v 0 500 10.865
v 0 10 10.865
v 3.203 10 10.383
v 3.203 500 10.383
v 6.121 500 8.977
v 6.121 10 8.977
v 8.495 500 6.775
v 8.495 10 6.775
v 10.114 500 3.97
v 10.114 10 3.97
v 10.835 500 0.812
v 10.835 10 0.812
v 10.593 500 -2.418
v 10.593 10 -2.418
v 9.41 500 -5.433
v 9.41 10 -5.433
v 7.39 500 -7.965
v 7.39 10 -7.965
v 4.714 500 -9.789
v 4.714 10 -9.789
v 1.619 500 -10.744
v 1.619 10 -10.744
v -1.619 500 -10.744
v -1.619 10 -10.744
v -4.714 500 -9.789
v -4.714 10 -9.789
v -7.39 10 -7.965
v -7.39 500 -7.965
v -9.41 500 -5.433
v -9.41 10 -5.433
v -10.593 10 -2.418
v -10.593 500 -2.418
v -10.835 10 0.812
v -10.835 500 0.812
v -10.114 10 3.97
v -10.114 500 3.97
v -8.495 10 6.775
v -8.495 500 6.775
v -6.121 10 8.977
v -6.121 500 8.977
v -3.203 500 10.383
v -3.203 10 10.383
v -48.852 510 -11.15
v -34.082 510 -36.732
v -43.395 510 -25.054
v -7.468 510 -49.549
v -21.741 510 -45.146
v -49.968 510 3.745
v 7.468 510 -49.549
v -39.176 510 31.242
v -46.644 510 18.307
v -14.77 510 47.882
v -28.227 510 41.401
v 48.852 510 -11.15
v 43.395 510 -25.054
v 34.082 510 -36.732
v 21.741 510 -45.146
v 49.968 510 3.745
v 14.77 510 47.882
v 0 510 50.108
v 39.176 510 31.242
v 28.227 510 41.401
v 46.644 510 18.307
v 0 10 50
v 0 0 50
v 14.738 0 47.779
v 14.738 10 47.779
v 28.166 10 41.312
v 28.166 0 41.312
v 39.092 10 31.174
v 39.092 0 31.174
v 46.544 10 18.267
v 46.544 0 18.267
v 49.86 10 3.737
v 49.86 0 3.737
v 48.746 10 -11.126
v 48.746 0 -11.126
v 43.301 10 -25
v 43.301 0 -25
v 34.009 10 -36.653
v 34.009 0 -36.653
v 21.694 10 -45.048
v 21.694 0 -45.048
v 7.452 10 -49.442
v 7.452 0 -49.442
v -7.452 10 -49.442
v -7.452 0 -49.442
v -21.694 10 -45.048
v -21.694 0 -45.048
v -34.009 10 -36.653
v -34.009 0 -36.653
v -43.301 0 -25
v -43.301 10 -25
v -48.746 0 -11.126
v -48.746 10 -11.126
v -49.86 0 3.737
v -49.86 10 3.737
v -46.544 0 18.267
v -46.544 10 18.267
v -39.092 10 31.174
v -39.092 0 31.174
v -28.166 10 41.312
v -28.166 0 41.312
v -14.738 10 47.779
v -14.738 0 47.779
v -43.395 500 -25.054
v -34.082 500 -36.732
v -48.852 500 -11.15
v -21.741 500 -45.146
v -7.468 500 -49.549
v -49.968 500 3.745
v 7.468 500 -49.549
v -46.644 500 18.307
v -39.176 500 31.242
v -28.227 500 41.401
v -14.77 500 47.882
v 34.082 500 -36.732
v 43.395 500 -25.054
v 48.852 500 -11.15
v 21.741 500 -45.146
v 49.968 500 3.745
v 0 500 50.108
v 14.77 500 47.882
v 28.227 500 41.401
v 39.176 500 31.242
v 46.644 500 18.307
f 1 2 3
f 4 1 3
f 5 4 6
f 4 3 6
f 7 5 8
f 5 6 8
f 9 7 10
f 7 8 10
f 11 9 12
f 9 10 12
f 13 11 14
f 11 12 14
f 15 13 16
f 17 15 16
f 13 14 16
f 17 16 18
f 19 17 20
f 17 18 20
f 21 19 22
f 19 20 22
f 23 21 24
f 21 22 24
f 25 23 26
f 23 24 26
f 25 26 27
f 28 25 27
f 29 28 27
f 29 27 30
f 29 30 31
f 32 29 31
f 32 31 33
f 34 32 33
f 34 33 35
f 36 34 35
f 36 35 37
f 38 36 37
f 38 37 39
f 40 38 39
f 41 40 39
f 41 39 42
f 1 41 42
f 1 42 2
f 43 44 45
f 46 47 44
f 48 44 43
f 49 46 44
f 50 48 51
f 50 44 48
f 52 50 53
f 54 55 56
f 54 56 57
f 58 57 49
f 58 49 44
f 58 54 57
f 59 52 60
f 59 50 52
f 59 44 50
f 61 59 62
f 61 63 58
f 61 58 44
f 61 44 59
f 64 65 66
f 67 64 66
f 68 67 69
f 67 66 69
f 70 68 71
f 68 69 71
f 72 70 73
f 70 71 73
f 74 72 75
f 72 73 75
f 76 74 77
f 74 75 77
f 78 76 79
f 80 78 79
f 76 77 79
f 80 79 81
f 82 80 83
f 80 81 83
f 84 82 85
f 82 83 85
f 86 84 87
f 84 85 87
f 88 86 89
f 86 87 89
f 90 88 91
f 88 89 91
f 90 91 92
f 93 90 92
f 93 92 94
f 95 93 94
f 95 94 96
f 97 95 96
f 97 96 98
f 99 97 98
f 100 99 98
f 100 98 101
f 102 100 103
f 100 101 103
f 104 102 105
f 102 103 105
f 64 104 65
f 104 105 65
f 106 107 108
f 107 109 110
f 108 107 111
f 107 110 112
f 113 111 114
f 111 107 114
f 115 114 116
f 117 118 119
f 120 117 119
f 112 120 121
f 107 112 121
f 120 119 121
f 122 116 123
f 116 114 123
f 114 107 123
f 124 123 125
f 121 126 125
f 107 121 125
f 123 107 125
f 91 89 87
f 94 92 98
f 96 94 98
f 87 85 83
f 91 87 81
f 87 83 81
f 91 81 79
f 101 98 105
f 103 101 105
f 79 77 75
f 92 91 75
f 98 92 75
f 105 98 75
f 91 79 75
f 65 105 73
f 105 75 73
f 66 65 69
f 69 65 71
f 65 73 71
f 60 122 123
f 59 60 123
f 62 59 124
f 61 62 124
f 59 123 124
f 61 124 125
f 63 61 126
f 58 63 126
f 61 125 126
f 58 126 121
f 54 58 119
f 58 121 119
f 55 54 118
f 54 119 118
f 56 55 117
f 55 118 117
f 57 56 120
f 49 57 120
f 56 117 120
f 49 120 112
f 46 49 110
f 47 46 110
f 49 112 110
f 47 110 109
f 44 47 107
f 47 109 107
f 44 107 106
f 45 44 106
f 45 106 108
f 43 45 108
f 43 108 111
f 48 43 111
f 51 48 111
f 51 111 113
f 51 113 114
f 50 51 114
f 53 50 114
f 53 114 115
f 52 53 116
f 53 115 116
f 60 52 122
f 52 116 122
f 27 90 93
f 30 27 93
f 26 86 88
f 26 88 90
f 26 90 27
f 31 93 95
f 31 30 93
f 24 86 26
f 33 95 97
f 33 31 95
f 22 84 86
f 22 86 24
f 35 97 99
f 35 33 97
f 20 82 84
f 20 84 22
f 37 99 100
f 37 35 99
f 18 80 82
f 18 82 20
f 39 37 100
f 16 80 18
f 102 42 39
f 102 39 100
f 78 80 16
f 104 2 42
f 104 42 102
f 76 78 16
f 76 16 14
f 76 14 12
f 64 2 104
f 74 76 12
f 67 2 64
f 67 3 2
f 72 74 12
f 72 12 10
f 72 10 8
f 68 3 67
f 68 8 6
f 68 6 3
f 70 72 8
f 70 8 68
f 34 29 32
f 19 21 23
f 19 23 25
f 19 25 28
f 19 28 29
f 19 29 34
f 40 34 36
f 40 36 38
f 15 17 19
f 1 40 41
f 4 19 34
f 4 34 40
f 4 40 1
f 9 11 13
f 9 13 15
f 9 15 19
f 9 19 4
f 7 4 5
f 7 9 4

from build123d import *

# Parameters (mm, degrees)
SKETCH1_R           = 50
BOSS_EXTRUDE1_DEPTH = 10
SKETCH7_R           = 50.108210293
BOSS_EXTRUDE2_DEPTH = 10
SKETCH8_R           = 10.865455154
BOSS_EXTRUDE3_DEPTH = 500


with BuildPart() as part:
    # Sketch1 → Boss-Extrude1 (new body)
    with BuildSketch(Plane(origin=(0, 0, 0), x_dir=(1, 0, 0), z_dir=(0, 1, 0))):
        with Locations(Location((0, 0, 0), (0, 0, 270))):
            Circle(SKETCH1_R)
    extrude(amount=BOSS_EXTRUDE1_DEPTH)

    # Sketch8 → Boss-Extrude3 (add)
    with BuildSketch(Plane(origin=(0, 0, 0), x_dir=(1, 0, 0), z_dir=(0, 1, 0))):
        with Locations(Location((0, 0, 0), (0, 0, 270))):
            Circle(SKETCH8_R)
    extrude(amount=BOSS_EXTRUDE3_DEPTH)


with BuildPart() as body_2:
    # Sketch7 → Boss-Extrude2 (new body)
    with BuildSketch(Plane(origin=(0, 500, 0), x_dir=(1, 0, 0), z_dir=(0, 1, 0))):
        with Locations(Location((0, 0, 0), (0, 0, 270))):
            Circle(SKETCH7_R)
    extrude(amount=BOSS_EXTRUDE2_DEPTH)


solid = Compound([part.part, body_2.part])
